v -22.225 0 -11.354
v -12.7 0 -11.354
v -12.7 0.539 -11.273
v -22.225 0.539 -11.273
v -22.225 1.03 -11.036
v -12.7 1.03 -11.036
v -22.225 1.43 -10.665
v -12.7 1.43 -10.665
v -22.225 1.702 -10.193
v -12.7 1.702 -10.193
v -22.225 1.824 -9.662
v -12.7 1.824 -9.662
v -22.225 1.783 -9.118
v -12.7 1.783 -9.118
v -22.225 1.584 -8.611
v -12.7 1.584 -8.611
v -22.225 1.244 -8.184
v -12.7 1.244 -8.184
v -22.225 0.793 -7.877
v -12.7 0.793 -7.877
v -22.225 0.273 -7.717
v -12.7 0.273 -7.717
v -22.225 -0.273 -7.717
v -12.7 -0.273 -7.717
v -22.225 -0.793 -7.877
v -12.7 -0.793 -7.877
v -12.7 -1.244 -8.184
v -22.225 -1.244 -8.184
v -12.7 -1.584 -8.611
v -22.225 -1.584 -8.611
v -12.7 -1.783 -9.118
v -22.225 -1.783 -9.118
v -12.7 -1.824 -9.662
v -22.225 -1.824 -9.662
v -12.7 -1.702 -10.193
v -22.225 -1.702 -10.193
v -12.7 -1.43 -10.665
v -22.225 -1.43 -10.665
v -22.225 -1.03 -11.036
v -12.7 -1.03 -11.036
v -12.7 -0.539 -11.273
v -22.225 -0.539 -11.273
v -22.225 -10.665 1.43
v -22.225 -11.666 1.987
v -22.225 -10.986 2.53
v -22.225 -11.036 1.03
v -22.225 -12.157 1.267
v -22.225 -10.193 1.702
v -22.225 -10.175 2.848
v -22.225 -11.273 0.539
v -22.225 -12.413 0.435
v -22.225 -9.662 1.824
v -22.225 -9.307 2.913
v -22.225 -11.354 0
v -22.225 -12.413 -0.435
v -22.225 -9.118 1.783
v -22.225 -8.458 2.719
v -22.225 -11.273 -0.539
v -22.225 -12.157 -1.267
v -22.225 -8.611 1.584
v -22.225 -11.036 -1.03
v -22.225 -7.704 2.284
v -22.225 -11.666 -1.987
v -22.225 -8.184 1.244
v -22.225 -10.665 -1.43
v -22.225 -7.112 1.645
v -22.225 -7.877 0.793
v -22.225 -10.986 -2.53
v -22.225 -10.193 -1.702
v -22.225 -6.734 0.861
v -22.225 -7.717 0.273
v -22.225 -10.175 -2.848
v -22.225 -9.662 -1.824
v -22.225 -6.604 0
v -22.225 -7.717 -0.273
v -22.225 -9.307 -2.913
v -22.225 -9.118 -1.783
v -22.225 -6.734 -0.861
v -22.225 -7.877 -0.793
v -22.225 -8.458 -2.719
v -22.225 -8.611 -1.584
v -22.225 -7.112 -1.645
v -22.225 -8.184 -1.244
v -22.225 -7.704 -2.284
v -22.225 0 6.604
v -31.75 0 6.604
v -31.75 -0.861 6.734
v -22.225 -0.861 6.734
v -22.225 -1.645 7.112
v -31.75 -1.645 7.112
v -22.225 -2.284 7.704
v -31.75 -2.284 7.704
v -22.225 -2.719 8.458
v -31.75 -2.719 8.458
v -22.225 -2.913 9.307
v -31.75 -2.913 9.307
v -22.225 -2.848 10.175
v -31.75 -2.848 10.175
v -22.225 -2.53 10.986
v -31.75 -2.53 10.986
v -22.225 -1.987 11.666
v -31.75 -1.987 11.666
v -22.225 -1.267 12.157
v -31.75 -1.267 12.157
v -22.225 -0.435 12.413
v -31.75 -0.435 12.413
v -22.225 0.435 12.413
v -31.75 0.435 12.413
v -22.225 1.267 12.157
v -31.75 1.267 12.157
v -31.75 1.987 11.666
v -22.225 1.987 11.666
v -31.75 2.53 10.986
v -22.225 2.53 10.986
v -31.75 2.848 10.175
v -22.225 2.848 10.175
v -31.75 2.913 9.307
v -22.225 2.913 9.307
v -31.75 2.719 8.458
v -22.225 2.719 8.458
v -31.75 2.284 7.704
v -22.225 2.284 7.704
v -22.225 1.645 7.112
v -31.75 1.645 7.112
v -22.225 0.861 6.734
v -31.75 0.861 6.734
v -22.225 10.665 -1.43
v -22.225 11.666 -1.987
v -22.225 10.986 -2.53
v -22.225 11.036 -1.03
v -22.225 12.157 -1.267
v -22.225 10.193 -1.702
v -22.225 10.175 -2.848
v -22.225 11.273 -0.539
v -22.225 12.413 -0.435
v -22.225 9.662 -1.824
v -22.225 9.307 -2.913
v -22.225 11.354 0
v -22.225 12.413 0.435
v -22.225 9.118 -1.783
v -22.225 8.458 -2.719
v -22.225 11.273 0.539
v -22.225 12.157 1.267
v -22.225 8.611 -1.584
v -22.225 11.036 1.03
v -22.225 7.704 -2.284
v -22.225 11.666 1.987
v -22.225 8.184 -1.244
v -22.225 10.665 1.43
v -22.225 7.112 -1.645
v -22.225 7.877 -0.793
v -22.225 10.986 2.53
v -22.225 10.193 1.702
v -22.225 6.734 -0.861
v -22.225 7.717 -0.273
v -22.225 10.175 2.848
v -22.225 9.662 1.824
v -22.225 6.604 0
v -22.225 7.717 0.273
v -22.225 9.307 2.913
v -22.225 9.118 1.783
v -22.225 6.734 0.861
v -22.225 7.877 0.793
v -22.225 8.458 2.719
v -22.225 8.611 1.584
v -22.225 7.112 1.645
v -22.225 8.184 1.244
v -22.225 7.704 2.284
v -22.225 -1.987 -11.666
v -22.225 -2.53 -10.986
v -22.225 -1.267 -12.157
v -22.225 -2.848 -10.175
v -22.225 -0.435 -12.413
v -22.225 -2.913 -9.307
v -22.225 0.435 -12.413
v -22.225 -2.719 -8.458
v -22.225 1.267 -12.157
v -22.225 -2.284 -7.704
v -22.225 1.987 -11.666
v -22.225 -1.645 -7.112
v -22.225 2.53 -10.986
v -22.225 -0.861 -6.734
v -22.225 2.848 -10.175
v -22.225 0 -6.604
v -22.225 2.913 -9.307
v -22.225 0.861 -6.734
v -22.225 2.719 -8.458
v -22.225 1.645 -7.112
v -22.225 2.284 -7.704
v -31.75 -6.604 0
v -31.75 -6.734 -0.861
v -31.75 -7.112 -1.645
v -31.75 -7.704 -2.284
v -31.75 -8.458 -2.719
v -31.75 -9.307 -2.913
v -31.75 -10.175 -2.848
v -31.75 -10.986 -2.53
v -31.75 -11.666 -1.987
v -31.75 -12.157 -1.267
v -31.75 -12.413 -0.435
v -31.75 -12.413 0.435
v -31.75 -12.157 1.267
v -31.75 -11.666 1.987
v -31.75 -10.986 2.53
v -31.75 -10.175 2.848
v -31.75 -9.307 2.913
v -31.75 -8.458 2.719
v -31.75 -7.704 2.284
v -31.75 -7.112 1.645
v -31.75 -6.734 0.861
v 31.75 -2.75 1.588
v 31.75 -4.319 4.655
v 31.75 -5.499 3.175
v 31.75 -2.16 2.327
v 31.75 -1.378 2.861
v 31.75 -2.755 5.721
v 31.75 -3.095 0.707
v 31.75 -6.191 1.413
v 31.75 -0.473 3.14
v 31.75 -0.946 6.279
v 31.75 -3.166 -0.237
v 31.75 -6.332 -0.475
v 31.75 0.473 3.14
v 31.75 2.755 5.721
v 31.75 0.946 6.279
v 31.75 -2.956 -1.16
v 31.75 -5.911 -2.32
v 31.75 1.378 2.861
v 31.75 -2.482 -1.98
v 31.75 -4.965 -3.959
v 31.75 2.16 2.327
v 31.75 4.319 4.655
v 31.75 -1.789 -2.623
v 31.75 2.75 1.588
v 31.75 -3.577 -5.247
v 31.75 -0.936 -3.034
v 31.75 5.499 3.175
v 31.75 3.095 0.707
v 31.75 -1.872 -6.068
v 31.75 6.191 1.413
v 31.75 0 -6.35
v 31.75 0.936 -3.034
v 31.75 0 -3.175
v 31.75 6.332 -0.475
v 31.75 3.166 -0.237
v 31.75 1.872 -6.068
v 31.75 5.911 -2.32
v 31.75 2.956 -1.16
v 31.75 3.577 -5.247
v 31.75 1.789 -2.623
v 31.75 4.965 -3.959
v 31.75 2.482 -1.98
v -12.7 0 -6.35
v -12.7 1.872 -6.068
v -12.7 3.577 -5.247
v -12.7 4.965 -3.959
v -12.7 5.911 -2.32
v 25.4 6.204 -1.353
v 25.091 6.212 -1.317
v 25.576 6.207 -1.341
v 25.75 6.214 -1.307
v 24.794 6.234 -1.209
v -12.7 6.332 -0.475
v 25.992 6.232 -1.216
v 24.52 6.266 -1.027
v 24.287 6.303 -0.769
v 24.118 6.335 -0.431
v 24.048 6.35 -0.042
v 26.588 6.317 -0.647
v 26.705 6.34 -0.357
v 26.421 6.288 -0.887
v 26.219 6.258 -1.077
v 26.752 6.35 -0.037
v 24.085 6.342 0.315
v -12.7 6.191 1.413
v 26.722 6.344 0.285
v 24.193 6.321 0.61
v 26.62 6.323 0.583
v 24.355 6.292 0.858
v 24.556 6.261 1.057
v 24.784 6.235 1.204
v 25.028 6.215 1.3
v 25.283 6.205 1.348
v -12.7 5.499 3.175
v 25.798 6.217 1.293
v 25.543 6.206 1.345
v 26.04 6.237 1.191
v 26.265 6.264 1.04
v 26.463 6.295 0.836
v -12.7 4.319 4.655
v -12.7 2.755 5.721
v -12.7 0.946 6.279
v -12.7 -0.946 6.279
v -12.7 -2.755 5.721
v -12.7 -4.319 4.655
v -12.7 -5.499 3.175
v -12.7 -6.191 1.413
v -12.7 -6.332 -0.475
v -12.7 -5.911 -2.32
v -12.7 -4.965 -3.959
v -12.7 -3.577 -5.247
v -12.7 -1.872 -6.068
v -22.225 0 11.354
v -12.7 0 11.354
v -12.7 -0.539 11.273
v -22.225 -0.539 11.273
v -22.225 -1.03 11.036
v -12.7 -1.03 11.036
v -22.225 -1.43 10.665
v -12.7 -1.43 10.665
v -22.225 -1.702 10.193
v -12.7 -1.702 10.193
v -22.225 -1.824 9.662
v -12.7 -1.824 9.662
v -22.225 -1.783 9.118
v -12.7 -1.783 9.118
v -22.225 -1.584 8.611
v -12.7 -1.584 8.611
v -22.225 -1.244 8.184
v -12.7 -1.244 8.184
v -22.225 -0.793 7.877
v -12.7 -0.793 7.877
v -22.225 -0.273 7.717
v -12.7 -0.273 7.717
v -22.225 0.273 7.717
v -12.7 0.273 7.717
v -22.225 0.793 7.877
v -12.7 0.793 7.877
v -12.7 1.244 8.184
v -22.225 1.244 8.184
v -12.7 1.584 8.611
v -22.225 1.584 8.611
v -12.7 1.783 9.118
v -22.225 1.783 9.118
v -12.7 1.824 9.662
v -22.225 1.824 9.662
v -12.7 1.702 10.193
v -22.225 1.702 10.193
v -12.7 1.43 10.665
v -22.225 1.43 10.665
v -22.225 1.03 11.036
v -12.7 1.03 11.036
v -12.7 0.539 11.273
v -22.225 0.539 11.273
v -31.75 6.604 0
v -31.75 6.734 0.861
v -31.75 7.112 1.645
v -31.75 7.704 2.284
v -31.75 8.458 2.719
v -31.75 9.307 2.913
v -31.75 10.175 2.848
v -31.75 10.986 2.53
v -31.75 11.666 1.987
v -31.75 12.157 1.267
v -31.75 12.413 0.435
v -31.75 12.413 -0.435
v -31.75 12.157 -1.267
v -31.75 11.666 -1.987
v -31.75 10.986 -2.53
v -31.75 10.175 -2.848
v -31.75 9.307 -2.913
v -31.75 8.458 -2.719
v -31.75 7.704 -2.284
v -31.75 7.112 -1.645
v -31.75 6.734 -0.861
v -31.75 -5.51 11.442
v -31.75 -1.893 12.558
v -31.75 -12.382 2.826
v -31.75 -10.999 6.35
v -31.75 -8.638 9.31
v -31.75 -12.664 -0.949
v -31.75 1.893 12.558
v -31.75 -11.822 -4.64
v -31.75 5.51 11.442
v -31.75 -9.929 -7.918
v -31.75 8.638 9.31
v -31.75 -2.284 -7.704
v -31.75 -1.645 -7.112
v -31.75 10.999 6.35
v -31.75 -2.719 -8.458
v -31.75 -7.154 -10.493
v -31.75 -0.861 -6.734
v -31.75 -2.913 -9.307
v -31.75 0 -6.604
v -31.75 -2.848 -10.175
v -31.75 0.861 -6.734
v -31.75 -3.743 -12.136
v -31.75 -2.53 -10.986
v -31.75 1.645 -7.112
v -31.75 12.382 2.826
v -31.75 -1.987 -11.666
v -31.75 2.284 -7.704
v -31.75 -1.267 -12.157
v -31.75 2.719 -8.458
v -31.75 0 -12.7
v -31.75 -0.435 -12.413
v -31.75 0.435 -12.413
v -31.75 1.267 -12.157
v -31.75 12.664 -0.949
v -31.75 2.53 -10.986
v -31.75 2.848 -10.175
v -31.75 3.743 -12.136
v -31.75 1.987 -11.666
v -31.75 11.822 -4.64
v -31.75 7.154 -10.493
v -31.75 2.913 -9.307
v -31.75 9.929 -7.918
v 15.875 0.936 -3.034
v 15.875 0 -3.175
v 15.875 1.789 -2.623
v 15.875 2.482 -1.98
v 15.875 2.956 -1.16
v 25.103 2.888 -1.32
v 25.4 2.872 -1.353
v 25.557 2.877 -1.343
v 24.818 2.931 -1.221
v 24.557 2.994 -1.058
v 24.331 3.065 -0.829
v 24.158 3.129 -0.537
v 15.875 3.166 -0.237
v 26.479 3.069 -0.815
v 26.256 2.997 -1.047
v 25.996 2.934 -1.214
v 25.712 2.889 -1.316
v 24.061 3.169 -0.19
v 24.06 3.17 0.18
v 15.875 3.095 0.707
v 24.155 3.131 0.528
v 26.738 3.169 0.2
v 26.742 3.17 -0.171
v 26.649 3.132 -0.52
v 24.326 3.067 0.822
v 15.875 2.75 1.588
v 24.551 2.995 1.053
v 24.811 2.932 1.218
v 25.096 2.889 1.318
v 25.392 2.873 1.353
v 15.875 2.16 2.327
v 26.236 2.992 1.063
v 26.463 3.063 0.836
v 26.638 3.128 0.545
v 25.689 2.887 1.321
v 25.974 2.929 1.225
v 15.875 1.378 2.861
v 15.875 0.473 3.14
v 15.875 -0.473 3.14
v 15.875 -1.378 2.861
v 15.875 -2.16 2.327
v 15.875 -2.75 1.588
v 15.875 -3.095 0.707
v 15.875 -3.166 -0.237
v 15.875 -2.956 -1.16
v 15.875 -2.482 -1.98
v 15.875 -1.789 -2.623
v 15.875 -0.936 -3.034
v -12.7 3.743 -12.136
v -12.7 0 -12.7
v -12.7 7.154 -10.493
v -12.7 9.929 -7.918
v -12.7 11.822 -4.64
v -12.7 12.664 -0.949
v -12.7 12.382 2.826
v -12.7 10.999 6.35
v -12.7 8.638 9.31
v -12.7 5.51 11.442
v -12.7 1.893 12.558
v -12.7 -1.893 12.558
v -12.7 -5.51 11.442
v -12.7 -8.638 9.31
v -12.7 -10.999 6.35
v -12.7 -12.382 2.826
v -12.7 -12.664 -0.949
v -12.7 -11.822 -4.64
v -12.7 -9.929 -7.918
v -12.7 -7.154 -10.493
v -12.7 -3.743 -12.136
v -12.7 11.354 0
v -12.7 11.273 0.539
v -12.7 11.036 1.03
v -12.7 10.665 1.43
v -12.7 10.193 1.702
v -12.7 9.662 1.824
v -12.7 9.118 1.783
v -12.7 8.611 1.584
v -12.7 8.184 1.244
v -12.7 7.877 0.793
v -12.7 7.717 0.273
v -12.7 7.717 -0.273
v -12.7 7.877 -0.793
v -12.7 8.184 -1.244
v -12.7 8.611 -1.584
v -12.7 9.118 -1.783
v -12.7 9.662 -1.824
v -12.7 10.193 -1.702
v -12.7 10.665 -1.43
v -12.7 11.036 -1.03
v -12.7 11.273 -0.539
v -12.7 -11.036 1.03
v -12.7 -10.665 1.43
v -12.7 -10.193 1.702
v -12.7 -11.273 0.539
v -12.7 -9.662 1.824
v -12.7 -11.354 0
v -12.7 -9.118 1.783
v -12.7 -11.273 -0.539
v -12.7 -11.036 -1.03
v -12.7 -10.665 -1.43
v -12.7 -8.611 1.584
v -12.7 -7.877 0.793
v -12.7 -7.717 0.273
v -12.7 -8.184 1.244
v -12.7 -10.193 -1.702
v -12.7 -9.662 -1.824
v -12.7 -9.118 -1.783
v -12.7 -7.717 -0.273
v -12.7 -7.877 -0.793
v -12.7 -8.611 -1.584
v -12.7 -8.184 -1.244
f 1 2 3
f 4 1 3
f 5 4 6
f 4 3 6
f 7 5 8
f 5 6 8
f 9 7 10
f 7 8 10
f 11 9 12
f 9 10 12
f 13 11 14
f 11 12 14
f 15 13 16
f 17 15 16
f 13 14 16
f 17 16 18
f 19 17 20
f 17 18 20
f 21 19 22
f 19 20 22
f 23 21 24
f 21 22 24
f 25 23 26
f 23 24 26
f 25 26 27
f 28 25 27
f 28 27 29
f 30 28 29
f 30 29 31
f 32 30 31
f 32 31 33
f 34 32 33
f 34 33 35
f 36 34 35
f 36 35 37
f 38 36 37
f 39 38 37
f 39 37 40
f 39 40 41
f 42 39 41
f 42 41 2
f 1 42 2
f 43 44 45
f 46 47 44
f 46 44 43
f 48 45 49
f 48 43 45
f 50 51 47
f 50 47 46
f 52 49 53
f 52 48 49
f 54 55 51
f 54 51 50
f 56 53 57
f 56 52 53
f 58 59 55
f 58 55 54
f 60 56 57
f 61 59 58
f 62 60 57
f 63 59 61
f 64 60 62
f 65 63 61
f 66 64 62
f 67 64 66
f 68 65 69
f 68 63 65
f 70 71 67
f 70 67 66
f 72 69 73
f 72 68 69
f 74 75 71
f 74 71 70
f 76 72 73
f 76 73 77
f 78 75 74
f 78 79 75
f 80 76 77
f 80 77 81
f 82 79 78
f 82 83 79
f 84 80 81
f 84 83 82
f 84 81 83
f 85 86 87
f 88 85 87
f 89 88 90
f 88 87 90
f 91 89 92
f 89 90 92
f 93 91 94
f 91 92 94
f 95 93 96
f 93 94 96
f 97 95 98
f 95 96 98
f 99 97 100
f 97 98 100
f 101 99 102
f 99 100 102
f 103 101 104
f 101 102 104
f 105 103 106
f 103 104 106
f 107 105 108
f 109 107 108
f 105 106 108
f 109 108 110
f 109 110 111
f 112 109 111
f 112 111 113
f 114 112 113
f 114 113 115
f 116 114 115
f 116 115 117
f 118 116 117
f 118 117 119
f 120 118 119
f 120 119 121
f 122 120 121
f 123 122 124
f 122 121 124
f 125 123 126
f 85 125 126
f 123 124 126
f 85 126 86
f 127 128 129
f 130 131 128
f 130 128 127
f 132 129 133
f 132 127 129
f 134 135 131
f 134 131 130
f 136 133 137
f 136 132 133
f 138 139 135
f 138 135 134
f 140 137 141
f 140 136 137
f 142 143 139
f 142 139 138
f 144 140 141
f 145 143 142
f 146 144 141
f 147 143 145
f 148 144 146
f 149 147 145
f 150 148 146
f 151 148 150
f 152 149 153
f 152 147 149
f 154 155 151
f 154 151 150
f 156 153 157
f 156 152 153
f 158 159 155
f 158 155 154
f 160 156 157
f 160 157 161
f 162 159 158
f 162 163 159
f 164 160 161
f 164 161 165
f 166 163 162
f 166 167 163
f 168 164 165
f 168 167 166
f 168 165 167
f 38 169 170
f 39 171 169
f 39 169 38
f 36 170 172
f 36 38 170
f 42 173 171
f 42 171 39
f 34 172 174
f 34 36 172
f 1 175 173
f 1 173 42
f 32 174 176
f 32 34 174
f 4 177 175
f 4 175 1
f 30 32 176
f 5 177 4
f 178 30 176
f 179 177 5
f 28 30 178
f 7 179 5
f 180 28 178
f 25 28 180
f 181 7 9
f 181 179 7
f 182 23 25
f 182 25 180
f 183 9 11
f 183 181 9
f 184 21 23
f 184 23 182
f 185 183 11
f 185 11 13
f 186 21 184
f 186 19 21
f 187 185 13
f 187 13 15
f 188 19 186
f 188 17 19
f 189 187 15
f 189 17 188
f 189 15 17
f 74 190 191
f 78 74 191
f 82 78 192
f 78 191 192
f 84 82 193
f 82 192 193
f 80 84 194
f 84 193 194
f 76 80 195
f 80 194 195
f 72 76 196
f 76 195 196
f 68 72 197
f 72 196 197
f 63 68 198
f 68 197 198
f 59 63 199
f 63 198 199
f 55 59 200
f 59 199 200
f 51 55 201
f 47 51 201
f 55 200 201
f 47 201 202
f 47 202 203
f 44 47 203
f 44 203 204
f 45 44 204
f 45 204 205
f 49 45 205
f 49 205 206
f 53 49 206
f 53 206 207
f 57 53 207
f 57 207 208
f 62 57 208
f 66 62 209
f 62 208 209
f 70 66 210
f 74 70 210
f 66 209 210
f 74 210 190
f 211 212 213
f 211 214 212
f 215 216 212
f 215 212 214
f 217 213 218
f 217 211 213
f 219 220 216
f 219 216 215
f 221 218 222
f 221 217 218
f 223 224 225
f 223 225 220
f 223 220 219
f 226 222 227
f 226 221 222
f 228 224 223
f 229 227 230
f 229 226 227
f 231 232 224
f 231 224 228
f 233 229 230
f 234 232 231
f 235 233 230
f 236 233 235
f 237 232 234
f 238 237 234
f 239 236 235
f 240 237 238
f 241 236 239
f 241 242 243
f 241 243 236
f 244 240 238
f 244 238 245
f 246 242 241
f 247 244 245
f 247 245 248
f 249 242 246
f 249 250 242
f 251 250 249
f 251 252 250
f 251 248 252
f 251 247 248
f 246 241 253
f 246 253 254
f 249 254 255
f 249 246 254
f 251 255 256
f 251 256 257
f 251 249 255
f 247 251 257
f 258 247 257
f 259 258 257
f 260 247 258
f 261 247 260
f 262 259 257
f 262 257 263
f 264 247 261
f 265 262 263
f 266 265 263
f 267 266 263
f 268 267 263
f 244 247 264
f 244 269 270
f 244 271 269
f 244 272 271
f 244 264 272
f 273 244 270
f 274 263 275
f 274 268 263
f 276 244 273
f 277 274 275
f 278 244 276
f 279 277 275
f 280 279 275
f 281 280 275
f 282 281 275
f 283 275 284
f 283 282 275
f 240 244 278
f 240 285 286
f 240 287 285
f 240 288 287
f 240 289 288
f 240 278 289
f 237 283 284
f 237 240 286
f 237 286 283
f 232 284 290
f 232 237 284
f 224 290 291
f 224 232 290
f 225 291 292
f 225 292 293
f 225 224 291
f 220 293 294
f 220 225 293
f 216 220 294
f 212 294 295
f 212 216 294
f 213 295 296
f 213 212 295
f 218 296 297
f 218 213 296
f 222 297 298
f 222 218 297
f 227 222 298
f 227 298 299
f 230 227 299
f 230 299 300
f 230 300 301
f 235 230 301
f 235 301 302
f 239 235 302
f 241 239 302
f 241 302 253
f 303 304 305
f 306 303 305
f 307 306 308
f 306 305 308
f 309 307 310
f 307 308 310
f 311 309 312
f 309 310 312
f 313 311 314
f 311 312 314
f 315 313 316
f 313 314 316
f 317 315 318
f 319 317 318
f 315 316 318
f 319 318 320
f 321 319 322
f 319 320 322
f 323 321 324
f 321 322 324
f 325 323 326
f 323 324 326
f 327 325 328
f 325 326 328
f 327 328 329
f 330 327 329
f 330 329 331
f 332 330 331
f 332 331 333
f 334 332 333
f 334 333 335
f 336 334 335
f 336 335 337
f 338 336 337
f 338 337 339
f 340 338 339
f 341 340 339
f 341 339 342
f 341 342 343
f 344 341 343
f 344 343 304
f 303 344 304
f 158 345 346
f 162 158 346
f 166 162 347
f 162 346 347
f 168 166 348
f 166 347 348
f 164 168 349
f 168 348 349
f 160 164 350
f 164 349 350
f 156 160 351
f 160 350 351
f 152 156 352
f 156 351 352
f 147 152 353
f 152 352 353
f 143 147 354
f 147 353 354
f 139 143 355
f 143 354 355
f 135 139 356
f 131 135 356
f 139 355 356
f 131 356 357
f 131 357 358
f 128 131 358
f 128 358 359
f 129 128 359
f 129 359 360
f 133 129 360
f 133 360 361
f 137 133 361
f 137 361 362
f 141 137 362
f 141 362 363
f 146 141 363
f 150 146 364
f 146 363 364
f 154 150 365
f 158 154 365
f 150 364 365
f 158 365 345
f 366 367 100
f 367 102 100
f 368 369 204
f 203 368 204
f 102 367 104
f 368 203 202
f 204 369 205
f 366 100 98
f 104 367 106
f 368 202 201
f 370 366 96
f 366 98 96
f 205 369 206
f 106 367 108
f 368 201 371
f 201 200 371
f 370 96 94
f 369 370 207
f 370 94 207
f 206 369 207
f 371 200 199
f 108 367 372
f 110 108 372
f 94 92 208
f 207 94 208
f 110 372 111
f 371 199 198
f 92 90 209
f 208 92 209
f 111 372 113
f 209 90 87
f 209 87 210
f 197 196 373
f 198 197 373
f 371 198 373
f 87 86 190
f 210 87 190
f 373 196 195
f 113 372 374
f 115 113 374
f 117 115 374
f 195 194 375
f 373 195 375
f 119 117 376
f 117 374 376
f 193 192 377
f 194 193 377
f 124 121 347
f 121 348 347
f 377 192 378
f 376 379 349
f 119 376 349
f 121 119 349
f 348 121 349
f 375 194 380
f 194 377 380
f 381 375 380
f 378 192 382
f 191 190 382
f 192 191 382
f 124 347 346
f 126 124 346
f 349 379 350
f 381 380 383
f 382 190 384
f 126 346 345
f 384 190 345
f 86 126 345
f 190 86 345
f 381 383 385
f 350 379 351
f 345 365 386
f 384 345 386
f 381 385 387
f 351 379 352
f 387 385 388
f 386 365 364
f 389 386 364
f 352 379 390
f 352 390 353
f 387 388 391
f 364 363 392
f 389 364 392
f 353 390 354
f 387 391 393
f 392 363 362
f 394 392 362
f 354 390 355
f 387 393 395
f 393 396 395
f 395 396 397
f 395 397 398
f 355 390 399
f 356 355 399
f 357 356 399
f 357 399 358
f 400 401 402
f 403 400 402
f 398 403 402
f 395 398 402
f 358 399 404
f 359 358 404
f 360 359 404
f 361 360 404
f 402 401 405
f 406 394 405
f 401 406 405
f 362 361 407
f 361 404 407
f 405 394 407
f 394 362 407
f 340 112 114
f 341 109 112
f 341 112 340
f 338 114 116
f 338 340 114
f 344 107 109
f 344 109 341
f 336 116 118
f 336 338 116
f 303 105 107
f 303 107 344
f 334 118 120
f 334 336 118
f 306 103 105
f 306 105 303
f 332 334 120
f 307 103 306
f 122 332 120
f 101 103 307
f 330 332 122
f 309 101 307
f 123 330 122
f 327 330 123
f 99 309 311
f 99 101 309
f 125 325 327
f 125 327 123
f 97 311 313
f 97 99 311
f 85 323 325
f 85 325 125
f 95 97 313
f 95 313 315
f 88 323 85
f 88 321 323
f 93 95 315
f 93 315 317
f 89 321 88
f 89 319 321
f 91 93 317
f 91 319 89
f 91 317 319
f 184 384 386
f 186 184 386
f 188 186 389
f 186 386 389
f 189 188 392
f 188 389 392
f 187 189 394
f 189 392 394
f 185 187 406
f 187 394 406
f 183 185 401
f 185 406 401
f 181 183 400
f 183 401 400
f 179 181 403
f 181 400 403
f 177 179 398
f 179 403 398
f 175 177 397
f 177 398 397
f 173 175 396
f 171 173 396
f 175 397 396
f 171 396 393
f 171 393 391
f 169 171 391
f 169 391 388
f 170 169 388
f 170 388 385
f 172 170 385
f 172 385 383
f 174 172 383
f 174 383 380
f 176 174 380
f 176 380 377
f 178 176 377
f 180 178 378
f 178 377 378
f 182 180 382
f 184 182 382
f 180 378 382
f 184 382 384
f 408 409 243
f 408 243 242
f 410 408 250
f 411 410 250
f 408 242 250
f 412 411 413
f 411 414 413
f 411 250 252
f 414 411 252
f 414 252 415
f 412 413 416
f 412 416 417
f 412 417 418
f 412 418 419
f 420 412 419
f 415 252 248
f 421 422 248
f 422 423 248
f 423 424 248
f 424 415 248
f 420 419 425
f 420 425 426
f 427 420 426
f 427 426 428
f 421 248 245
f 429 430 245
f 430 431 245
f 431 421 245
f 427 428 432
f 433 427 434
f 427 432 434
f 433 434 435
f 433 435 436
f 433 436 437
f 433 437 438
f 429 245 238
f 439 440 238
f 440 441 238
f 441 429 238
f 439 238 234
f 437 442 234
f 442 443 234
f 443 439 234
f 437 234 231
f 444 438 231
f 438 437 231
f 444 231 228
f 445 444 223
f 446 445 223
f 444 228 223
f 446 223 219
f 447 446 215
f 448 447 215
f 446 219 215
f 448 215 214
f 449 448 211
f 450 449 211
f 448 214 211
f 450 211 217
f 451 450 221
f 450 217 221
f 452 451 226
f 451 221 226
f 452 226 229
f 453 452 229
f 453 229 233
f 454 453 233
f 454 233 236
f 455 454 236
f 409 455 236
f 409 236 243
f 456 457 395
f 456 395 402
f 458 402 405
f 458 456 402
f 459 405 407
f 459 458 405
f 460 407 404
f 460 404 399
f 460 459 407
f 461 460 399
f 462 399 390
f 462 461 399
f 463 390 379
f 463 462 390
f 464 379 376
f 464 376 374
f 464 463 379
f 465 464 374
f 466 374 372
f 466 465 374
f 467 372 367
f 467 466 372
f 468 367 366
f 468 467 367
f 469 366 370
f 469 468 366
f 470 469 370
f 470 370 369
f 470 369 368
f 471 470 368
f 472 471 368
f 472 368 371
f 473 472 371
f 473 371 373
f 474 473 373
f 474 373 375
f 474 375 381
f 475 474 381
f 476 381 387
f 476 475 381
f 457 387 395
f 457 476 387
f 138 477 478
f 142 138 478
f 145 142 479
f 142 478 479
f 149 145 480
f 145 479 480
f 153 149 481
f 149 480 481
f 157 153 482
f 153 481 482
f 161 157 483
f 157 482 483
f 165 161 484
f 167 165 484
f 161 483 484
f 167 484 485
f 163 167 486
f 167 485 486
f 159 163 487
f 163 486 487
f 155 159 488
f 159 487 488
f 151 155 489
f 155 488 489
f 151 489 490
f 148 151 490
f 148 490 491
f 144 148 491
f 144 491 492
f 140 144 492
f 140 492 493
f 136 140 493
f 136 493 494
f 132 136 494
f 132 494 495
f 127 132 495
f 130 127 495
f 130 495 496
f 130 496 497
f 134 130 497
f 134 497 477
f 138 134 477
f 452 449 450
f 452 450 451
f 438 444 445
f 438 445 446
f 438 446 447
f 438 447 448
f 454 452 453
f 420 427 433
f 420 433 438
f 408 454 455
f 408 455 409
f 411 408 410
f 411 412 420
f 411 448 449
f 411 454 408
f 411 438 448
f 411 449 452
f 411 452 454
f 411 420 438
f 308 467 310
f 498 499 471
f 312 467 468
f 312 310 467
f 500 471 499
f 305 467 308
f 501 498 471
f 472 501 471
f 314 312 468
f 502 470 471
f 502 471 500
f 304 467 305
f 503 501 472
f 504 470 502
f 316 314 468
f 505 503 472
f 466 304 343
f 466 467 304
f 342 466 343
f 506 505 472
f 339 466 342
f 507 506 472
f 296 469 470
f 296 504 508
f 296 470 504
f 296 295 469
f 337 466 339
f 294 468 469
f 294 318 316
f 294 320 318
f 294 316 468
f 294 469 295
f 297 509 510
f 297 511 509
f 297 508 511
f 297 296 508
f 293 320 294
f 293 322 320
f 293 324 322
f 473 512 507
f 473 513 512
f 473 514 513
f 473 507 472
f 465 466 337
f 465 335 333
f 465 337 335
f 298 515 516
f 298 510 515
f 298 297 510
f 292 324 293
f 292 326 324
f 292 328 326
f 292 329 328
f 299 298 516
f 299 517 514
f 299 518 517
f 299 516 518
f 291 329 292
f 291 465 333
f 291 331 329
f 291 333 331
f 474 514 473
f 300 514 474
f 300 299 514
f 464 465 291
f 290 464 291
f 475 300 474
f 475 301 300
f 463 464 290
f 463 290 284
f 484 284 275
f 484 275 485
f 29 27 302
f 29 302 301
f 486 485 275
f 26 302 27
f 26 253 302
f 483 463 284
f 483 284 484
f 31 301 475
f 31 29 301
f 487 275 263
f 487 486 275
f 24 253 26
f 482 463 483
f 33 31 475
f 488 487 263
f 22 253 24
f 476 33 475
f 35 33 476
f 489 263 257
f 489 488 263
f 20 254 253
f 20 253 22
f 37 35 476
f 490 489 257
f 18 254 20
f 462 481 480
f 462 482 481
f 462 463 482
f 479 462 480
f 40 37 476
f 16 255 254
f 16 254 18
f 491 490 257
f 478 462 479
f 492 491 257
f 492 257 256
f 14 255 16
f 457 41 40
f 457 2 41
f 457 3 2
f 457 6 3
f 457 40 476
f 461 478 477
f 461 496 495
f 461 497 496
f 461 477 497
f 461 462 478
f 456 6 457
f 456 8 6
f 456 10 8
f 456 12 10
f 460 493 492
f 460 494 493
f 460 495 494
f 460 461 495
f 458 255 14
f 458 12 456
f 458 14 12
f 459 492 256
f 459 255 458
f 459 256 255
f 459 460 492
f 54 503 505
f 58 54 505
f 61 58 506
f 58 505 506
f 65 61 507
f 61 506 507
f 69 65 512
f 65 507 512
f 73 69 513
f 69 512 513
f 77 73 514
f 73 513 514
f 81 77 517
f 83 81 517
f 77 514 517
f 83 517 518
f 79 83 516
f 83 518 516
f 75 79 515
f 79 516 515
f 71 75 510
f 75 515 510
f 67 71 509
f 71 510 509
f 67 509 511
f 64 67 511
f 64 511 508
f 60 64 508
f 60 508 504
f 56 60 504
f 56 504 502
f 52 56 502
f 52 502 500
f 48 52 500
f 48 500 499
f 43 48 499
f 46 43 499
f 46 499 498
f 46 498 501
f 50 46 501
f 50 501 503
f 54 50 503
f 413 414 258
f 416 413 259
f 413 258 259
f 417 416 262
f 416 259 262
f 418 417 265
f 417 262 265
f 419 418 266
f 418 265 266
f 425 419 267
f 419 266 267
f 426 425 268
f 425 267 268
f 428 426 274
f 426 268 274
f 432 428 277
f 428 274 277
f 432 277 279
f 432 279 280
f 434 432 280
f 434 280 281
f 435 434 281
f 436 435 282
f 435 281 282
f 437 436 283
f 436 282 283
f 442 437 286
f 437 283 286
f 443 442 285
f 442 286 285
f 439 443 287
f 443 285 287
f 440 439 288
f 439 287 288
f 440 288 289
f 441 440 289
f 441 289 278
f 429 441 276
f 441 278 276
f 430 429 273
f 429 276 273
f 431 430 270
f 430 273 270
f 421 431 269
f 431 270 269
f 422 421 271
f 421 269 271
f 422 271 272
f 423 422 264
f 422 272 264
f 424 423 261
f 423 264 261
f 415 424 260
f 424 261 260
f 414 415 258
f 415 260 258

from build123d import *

# Parameters (mm, degrees)
SKETCH1_R           = 12.7
BOSS_EXTRUDE1_DEPTH = 31.75
SKETCH2_R           = 3.175
CUT_EXTRUDE1_DEPTH  = 15.875
SKETCH3_R           = 12.7
SKETCH3_R_2         = 6.35
CUT_EXTRUDE2_DEPTH  = 44.45
SKETCH8_W           = 1.35255
SKETCH8_H           = 12.7
SKETCH4_R           = 1.8288
CUT_EXTRUDE3_DEPTH  = 48.941448757
SKETCH10_R          = 2.921
CUT_EXTRUDE5_DEPTH  = 9.525
CIRPATTERN1_COUNT   = 4


with BuildPart() as part:
    # Sketch1 → Boss-Extrude1 (new, symmetric)
    with BuildSketch(Plane(origin=(0, 0, 0), x_dir=(0, 0, -1), z_dir=(1, 0, 0))):
        Circle(SKETCH1_R)
    extrude(amount=BOSS_EXTRUDE1_DEPTH, both=True)

    # Sketch2 → Cut-Extrude1 (cut)
    with BuildSketch(Plane(origin=(31.75, 0, 0), x_dir=(0, 0, -1), z_dir=(1, 0, 0))):
        Circle(SKETCH2_R)
    extrude(amount=-CUT_EXTRUDE1_DEPTH, mode=Mode.SUBTRACT)

    # Sketch3 → Cut-Extrude2 (cut)
    with BuildSketch(Plane(origin=(31.75, 0, 0), x_dir=(0, 0, -1), z_dir=(1, 0, 0))):
        Circle(SKETCH3_R)
        Circle(SKETCH3_R_2, mode=Mode.SUBTRACT)
    extrude(amount=-CUT_EXTRUDE2_DEPTH, mode=Mode.SUBTRACT)

    # Sketch8 → #6-32 Tapped Hole2 (revolve, cut)
    with BuildSketch(Plane(origin=(25.4, 0, 0), x_dir=(0, 0, -1), z_dir=(1, 0, 0))):
        with Locations((0.676275, 6.35)):
            Rectangle(SKETCH8_W, SKETCH8_H)
    revolve(axis=Axis((25.4, -6.35, 0), (0, 1, 0)), mode=Mode.SUBTRACT)

    # Sketch4 → Cut-Extrude3 (cut, through all)
    with BuildSketch(Plane(origin=(-12.7, 0, 0), x_dir=(0, 0, -1), z_dir=(1, 0, 0))):
        with Locations((9.525, 0)):
            Circle(SKETCH4_R)
    cut_extrude3 = extrude(amount=-CUT_EXTRUDE3_DEPTH, mode=Mode.SUBTRACT)

    # Sketch10 → Cut-Extrude5 (cut)
    with BuildSketch(Plane.ZY.offset(31.75)):
        with Locations((-9.525, 0)):
            Circle(SKETCH10_R)
    cut_extrude5 = extrude(amount=-CUT_EXTRUDE5_DEPTH, mode=Mode.SUBTRACT)

    # CirPattern1: Cut-Extrude3, Cut-Extrude5 ×4 about axis
    cirpattern1_axis = Axis((0, 0, 0), (1, 0, 0))
    add([cut_extrude3.rotate(cirpattern1_axis, i * 360 / CIRPATTERN1_COUNT) for i in range(1, CIRPATTERN1_COUNT)], mode=Mode.SUBTRACT)
    add([cut_extrude5.rotate(cirpattern1_axis, i * 360 / CIRPATTERN1_COUNT) for i in range(1, CIRPATTERN1_COUNT)], mode=Mode.SUBTRACT)


solid = part.part
